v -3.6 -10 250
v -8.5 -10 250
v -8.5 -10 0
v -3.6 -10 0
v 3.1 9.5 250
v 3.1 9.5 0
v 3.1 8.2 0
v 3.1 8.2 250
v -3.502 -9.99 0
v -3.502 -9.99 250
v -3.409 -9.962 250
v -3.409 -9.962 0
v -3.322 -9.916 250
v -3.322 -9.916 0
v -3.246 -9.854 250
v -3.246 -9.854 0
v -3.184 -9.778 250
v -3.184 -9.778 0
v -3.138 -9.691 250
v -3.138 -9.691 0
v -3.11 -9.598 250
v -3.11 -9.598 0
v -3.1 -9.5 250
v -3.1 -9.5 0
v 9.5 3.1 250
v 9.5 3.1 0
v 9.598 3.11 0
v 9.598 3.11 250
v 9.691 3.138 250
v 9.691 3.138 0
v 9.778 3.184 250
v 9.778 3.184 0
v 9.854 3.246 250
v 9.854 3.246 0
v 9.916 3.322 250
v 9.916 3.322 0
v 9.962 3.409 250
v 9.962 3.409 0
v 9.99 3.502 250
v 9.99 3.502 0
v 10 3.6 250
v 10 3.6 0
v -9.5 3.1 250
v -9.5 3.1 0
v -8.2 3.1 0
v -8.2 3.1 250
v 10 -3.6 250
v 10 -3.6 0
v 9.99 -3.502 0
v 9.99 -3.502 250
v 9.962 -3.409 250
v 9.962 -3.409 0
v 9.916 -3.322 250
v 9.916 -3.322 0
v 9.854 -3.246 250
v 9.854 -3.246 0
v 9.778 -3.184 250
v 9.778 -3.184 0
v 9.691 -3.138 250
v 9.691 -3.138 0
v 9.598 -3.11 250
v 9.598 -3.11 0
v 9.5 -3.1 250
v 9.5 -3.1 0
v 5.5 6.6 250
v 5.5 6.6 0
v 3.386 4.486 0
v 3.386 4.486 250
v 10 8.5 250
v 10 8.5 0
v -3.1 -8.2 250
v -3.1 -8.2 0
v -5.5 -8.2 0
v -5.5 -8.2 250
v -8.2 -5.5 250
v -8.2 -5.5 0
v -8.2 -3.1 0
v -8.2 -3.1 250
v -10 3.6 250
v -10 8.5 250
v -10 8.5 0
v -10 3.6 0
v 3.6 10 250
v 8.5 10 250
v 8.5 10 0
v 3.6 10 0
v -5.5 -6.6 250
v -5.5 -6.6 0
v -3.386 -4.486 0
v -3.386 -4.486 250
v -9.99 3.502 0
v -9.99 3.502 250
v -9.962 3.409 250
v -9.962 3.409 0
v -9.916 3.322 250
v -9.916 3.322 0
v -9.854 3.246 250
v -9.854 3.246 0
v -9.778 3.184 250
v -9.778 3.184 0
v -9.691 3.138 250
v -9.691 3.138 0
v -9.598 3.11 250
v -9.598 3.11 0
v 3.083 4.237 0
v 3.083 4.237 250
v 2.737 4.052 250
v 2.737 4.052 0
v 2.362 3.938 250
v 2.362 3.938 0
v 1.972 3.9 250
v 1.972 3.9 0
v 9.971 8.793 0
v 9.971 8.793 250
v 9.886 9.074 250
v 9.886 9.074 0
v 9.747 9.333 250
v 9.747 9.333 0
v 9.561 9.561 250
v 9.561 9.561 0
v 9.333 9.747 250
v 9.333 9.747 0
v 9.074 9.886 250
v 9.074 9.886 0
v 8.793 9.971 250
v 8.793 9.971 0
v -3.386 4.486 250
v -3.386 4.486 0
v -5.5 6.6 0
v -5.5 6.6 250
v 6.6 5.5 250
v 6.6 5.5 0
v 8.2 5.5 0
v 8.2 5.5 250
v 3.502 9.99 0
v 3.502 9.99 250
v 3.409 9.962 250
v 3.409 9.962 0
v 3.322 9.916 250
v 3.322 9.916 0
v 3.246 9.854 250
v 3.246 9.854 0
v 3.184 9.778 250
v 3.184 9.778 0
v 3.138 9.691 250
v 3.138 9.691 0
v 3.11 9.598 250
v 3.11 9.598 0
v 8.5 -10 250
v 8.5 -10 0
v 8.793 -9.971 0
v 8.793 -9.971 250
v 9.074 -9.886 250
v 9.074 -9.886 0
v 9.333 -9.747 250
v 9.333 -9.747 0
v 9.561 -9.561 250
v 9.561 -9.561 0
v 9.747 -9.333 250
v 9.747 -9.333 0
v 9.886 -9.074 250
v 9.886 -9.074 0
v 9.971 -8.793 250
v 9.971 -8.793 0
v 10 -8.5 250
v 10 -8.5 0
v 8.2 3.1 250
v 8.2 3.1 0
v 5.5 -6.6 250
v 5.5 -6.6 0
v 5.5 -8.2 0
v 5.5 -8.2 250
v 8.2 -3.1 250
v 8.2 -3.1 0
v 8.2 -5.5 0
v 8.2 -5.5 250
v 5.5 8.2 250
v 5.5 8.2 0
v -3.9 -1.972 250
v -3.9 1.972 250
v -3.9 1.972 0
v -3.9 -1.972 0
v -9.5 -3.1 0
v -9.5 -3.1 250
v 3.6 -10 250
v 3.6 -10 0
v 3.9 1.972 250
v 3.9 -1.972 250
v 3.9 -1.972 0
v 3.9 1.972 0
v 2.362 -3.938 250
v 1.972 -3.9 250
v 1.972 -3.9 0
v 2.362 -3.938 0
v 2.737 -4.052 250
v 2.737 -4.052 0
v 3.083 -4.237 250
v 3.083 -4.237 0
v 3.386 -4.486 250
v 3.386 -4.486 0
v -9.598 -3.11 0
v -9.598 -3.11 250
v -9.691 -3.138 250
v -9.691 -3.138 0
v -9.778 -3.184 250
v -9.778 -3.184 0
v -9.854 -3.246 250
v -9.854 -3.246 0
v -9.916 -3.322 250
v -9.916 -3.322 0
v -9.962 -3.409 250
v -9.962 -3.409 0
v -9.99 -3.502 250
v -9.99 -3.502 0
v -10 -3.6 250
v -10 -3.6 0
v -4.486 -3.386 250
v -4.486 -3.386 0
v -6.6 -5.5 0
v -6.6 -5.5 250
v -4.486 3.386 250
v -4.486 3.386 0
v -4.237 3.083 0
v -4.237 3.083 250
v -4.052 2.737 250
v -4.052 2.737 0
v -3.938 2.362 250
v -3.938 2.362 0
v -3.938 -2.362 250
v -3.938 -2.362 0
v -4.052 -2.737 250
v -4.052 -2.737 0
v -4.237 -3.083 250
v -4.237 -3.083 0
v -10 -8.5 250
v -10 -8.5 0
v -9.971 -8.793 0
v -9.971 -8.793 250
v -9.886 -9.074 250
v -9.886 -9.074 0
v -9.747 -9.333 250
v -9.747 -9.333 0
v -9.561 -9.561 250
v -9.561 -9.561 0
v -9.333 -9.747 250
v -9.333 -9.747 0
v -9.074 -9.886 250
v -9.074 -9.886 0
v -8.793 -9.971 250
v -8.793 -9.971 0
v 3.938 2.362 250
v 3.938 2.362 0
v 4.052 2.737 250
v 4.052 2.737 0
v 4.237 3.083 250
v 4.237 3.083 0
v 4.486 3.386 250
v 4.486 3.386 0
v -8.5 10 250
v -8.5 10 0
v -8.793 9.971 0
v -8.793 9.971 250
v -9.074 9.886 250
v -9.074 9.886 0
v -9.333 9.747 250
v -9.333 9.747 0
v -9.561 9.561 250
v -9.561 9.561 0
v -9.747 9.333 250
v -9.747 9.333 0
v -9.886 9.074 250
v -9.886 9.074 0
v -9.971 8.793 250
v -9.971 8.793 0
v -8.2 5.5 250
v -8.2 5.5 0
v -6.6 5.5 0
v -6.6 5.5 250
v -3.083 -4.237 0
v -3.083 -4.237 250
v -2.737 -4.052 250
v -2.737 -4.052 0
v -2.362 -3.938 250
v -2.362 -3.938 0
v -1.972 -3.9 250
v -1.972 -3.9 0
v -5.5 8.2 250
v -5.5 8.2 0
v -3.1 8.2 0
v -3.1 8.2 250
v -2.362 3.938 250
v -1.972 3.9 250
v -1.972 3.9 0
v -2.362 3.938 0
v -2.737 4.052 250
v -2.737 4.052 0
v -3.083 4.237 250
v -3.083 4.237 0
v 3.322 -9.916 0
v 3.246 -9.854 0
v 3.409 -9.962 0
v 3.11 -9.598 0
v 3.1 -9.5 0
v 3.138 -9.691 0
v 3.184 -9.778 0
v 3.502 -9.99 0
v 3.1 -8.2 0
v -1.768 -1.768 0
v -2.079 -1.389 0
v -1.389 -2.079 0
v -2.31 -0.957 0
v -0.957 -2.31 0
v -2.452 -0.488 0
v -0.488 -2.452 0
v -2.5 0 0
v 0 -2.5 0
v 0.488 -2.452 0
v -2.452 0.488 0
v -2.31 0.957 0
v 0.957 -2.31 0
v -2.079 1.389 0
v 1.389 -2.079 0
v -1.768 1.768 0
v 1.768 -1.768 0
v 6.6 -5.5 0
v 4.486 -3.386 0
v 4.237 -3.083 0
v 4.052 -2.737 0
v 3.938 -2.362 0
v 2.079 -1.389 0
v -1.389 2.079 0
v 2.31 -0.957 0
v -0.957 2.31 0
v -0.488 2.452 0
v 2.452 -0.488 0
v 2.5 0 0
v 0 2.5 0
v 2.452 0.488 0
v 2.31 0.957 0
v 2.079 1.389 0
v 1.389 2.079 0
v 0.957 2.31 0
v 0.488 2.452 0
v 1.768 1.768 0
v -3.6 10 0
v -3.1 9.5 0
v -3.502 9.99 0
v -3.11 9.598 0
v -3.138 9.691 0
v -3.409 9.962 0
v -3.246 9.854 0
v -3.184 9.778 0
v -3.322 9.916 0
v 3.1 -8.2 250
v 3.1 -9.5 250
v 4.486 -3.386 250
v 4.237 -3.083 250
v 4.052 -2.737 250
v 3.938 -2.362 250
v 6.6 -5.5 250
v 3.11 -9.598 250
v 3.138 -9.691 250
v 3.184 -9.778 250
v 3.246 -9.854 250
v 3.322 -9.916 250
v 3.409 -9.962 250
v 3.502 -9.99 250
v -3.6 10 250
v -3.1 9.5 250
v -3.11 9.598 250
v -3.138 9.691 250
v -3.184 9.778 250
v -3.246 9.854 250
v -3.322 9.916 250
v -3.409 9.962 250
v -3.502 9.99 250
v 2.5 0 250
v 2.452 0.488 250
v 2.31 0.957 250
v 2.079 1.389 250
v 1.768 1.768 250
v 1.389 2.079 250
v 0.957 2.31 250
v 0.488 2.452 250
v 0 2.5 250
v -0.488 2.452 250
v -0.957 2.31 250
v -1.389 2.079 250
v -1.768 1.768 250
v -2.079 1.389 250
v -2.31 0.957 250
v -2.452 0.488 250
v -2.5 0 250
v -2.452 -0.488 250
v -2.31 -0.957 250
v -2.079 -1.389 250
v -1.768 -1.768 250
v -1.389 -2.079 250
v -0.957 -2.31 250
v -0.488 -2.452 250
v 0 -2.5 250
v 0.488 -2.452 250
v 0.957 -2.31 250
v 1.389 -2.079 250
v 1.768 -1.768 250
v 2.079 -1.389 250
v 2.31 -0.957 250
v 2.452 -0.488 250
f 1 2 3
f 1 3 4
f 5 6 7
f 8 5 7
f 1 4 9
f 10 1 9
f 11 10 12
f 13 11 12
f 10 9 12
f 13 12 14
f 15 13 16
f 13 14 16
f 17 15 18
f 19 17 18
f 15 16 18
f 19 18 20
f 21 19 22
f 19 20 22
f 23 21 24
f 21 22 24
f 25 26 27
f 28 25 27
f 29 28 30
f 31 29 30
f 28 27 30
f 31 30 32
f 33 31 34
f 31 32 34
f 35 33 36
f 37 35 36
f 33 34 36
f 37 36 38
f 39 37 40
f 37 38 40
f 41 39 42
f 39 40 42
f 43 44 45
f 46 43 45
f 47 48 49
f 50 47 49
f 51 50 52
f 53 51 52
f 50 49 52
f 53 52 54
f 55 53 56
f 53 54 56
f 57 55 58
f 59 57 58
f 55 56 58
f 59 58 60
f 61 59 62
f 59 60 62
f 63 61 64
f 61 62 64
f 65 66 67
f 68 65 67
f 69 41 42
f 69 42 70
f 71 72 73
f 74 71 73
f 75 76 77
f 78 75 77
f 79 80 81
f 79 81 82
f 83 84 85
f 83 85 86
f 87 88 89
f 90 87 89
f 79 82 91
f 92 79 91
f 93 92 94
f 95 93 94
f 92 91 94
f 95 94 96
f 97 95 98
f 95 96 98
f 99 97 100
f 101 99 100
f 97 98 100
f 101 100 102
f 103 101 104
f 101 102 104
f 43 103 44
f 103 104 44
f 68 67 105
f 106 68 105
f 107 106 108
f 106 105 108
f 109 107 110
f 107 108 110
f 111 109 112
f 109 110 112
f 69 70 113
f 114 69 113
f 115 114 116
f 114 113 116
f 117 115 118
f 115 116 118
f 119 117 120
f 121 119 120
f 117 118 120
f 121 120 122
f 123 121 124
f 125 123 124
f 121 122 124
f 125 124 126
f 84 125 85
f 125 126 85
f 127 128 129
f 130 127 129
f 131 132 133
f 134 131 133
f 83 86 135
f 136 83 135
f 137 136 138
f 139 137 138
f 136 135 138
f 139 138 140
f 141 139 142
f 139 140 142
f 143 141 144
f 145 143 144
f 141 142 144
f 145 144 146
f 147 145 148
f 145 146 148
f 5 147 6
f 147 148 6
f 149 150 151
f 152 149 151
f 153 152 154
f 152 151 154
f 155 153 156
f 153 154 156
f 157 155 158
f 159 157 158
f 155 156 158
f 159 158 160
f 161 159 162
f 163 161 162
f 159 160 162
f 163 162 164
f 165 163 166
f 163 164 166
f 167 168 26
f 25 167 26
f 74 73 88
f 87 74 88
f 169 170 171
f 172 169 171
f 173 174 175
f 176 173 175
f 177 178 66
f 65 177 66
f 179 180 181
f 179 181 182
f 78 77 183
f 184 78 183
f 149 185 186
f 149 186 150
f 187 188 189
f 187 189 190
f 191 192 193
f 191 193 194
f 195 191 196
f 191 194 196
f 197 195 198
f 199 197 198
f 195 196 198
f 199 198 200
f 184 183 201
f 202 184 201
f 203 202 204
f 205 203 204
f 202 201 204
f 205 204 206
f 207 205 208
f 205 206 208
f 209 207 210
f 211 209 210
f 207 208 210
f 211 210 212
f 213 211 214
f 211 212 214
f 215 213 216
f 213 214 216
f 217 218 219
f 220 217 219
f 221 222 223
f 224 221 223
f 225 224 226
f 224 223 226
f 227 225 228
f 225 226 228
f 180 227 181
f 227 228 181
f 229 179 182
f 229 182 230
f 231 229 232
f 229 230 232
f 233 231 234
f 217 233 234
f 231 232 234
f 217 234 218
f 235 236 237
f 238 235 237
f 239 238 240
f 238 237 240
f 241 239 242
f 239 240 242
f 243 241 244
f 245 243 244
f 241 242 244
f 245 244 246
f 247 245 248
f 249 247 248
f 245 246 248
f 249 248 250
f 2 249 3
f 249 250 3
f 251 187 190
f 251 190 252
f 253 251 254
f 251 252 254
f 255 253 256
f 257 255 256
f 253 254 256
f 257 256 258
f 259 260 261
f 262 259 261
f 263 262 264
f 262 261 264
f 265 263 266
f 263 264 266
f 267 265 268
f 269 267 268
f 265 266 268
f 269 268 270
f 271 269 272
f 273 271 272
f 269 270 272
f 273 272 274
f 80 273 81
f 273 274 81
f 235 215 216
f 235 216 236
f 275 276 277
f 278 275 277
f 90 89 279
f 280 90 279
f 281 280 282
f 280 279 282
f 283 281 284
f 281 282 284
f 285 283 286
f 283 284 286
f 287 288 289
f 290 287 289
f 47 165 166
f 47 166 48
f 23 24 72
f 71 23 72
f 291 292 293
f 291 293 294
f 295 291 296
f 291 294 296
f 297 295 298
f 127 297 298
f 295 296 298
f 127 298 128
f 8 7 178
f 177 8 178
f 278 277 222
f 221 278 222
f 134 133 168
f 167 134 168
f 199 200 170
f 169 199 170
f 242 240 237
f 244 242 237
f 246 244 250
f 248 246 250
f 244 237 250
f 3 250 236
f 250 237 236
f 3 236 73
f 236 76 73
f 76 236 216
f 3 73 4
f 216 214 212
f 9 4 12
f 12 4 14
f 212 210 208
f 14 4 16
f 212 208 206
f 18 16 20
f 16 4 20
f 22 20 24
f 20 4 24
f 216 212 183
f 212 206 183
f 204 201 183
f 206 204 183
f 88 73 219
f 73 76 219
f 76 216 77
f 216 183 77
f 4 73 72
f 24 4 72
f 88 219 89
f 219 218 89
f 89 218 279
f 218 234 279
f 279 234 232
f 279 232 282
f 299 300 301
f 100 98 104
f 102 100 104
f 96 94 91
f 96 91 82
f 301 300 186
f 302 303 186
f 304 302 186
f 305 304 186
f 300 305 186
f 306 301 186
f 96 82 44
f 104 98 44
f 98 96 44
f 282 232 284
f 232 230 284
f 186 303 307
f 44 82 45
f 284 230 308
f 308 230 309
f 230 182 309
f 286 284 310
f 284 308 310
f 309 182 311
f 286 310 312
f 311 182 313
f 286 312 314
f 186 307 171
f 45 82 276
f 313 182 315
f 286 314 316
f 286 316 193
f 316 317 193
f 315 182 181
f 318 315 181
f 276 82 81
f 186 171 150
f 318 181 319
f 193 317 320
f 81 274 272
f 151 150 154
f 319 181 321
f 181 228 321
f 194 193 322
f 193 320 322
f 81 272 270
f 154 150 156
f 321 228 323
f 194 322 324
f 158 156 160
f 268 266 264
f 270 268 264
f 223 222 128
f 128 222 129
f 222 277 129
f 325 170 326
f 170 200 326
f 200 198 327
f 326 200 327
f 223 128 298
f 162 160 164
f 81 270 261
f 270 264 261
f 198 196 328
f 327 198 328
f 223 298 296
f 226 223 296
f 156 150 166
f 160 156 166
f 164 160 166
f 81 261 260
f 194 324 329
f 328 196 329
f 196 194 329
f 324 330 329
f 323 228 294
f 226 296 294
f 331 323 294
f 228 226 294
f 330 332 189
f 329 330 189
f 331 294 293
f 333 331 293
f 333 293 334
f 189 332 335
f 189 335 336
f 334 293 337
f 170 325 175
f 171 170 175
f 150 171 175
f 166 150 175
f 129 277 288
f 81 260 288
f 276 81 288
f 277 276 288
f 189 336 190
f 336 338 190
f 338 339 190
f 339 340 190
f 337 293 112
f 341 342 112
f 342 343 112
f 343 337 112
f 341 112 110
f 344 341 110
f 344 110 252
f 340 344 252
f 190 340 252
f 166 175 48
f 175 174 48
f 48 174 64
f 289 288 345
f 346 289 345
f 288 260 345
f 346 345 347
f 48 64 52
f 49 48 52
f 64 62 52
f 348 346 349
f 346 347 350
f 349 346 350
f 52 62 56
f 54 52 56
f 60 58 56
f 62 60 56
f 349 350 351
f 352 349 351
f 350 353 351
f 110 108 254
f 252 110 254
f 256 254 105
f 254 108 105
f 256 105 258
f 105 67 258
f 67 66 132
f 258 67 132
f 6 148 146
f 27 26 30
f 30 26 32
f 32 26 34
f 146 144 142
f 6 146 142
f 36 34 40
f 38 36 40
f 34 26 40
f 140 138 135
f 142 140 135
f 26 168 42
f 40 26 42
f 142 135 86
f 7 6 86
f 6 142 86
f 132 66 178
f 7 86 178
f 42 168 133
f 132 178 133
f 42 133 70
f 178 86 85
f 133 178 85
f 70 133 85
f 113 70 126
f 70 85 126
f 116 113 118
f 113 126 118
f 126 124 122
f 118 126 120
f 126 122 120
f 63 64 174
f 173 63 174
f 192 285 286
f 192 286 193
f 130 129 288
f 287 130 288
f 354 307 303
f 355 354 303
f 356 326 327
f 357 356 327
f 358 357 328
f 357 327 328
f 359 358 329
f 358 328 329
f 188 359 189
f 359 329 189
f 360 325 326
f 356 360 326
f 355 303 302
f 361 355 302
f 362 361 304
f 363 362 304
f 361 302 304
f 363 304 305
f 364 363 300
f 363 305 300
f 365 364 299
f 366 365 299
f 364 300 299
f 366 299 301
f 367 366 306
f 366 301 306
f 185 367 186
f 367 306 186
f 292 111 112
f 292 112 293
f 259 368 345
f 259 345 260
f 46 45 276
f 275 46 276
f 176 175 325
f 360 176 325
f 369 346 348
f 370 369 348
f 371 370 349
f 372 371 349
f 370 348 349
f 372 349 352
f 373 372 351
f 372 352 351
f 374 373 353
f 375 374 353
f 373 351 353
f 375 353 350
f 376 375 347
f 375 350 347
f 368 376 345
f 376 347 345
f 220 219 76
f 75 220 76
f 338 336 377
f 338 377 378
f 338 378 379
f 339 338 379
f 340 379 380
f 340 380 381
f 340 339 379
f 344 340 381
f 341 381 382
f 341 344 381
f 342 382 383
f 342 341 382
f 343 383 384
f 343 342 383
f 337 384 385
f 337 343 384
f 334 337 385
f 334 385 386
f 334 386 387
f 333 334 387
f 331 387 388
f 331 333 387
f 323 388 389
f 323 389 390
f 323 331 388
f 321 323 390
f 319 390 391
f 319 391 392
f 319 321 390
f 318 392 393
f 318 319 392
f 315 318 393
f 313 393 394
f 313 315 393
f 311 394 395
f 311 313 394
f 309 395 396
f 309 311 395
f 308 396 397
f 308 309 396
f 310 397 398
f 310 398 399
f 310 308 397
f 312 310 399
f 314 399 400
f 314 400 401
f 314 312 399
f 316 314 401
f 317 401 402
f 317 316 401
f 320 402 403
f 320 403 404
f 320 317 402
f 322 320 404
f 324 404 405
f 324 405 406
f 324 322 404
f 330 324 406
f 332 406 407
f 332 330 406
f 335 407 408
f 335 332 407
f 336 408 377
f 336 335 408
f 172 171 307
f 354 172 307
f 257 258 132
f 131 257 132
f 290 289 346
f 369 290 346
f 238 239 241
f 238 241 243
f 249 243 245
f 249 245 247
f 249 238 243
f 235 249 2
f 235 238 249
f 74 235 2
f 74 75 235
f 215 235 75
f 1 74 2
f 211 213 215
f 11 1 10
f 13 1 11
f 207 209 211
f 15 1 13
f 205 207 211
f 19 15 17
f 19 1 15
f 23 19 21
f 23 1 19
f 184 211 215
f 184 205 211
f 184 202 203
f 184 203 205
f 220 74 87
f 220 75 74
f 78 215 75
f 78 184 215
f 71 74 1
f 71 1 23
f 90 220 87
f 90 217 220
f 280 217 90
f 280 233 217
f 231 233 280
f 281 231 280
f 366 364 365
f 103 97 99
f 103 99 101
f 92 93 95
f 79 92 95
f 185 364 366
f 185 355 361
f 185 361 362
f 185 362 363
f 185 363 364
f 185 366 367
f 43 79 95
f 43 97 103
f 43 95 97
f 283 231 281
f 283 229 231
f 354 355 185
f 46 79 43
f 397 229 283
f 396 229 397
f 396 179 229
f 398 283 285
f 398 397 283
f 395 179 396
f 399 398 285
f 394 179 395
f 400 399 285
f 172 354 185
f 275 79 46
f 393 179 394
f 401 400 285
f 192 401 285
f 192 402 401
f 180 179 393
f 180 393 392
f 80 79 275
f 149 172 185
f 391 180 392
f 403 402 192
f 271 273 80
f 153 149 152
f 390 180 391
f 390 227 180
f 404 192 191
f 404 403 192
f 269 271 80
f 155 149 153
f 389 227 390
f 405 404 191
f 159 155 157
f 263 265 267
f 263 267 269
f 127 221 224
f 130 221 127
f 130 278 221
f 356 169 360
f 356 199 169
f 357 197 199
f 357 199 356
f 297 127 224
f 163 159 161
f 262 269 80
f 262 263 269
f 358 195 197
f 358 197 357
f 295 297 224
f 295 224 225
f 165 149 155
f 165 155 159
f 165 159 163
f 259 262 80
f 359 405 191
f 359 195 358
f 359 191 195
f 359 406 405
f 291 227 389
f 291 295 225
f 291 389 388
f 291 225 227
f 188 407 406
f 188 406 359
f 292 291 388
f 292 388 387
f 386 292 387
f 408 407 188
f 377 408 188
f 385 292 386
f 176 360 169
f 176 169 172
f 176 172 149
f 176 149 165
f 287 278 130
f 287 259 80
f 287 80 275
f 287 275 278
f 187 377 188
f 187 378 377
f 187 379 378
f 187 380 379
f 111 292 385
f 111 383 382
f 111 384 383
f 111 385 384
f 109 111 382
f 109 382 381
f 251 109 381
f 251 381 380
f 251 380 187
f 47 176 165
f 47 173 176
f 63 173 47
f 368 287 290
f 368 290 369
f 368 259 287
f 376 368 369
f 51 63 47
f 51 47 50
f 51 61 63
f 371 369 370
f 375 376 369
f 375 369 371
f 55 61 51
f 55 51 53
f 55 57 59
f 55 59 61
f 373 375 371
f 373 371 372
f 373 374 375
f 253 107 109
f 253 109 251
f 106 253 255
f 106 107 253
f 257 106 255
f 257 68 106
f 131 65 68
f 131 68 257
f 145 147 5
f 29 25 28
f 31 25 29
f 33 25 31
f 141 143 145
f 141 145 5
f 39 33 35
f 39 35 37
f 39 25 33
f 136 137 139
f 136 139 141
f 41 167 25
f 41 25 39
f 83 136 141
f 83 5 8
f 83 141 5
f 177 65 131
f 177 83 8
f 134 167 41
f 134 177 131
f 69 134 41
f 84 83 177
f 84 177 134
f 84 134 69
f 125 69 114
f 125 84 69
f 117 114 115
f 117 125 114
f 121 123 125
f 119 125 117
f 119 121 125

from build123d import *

# Parameters (mm, degrees)
SKETCH_1_R      = 2.5
EXTRUDE_1_DEPTH = 250


with BuildPart() as part:
    # 草图1 → 凸台-拉伸1 (new body)
    with BuildSketch(Plane.XY):
        with BuildLine():
            Line((3.9, 0), (3.9, 1.971572875))
            ThreePointArc((3.9, 1.971572875), (4.052240935, 2.73693974), (4.485786438, 3.385786438))
            Line((4.485786438, 3.385786438), (6.6, 5.5))
            Line((6.6, 5.5), (8.2, 5.5))
            Line((8.2, 5.5), (8.2, 3.1))
            Line((8.2, 3.1), (9.5, 3.1))
            ThreePointArc((9.5, 3.1), (9.853553391, 3.246446609), (10, 3.6))
            Line((10, 3.6), (10, 8.5))
            ThreePointArc((10, 8.5), (9.560660172, 9.560660172), (8.5, 10))
            Line((8.5, 10), (3.6, 10))
            ThreePointArc((3.6, 10), (3.246446609, 9.853553391), (3.1, 9.5))
            Line((3.1, 9.5), (3.1, 8.2))
            Line((3.1, 8.2), (5.5, 8.2))
            Line((5.5, 8.2), (5.5, 6.6))
            Line((5.5, 6.6), (3.385786438, 4.485786438))
            ThreePointArc((3.385786438, 4.485786438), (2.73693974, 4.052240935), (1.971572875, 3.9))
            Line((1.971572875, 3.9), (0, 3.9))
            Line((0, 3.9), (-1.971572875, 3.9))
            ThreePointArc((-1.971572875, 3.9), (-2.73693974, 4.052240935), (-3.385786438, 4.485786438))
            Line((-3.385786438, 4.485786438), (-5.5, 6.6))
            Line((-5.5, 6.6), (-5.5, 8.2))
            Line((-5.5, 8.2), (-3.1, 8.2))
            Line((-3.1, 8.2), (-3.1, 9.5))
            ThreePointArc((-3.1, 9.5), (-3.246446609, 9.853553391), (-3.6, 10))
            Line((-3.6, 10), (-8.5, 10))
            ThreePointArc((-8.5, 10), (-9.560660172, 9.560660172), (-10, 8.5))
            Line((-10, 8.5), (-10, 3.6))
            ThreePointArc((-10, 3.6), (-9.853553391, 3.246446609), (-9.5, 3.1))
            Line((-9.5, 3.1), (-8.2, 3.1))
            Line((-8.2, 3.1), (-8.2, 5.5))
            Line((-8.2, 5.5), (-6.6, 5.5))
            Line((-6.6, 5.5), (-4.485786438, 3.385786438))
            ThreePointArc((-4.485786438, 3.385786438), (-4.052240935, 2.73693974), (-3.9, 1.971572875))
            Line((-3.9, 1.971572875), (-3.9, 0))
            Line((-3.9, 0), (-3.9, -1.971572875))
            ThreePointArc((-3.9, -1.971572875), (-4.052240935, -2.73693974), (-4.485786438, -3.385786438))
            Line((-4.485786438, -3.385786438), (-6.6, -5.5))
            Line((-6.6, -5.5), (-8.2, -5.5))
            Line((-8.2, -5.5), (-8.2, -3.1))
            Line((-8.2, -3.1), (-9.5, -3.1))
            ThreePointArc((-9.5, -3.1), (-9.853553391, -3.246446609), (-10, -3.6))
            Line((-10, -3.6), (-10, -8.5))
            ThreePointArc((-10, -8.5), (-9.560660172, -9.560660172), (-8.5, -10))
            Line((-8.5, -10), (-3.6, -10))
            ThreePointArc((-3.6, -10), (-3.246446609, -9.853553391), (-3.1, -9.5))
            Line((-3.1, -9.5), (-3.1, -8.2))
            Line((-3.1, -8.2), (-5.5, -8.2))
            Line((-5.5, -8.2), (-5.5, -6.6))
            Line((-5.5, -6.6), (-3.385786438, -4.485786438))
            ThreePointArc((-3.385786438, -4.485786438), (-2.73693974, -4.052240935), (-1.971572875, -3.9))
            Line((-1.971572875, -3.9), (0, -3.9))
            Line((0, -3.9), (1.971572875, -3.9))
            ThreePointArc((1.971572875, -3.9), (2.73693974, -4.052240935), (3.385786438, -4.485786438))
            Line((3.385786438, -4.485786438), (5.5, -6.6))
            Line((5.5, -6.6), (5.5, -8.2))
            Line((5.5, -8.2), (3.1, -8.2))
            Line((3.1, -8.2), (3.1, -9.5))
            ThreePointArc((3.1, -9.5), (3.246446609, -9.853553391), (3.6, -10))
            Line((3.6, -10), (8.5, -10))
            ThreePointArc((8.5, -10), (9.560660172, -9.560660172), (10, -8.5))
            Line((10, -8.5), (10, -3.6))
            ThreePointArc((10, -3.6), (9.853553391, -3.246446609), (9.5, -3.1))
            Line((9.5, -3.1), (8.2, -3.1))
            Line((8.2, -3.1), (8.2, -5.5))
            Line((8.2, -5.5), (6.6, -5.5))
            Line((6.6, -5.5), (4.485786438, -3.385786438))
            ThreePointArc((4.485786438, -3.385786438), (4.052240935, -2.73693974), (3.9, -1.971572875))
            Line((3.9, -1.971572875), (3.9, 0))
        make_face()
        Circle(SKETCH_1_R, mode=Mode.SUBTRACT)
    extrude(amount=EXTRUDE_1_DEPTH)


solid = part.part
